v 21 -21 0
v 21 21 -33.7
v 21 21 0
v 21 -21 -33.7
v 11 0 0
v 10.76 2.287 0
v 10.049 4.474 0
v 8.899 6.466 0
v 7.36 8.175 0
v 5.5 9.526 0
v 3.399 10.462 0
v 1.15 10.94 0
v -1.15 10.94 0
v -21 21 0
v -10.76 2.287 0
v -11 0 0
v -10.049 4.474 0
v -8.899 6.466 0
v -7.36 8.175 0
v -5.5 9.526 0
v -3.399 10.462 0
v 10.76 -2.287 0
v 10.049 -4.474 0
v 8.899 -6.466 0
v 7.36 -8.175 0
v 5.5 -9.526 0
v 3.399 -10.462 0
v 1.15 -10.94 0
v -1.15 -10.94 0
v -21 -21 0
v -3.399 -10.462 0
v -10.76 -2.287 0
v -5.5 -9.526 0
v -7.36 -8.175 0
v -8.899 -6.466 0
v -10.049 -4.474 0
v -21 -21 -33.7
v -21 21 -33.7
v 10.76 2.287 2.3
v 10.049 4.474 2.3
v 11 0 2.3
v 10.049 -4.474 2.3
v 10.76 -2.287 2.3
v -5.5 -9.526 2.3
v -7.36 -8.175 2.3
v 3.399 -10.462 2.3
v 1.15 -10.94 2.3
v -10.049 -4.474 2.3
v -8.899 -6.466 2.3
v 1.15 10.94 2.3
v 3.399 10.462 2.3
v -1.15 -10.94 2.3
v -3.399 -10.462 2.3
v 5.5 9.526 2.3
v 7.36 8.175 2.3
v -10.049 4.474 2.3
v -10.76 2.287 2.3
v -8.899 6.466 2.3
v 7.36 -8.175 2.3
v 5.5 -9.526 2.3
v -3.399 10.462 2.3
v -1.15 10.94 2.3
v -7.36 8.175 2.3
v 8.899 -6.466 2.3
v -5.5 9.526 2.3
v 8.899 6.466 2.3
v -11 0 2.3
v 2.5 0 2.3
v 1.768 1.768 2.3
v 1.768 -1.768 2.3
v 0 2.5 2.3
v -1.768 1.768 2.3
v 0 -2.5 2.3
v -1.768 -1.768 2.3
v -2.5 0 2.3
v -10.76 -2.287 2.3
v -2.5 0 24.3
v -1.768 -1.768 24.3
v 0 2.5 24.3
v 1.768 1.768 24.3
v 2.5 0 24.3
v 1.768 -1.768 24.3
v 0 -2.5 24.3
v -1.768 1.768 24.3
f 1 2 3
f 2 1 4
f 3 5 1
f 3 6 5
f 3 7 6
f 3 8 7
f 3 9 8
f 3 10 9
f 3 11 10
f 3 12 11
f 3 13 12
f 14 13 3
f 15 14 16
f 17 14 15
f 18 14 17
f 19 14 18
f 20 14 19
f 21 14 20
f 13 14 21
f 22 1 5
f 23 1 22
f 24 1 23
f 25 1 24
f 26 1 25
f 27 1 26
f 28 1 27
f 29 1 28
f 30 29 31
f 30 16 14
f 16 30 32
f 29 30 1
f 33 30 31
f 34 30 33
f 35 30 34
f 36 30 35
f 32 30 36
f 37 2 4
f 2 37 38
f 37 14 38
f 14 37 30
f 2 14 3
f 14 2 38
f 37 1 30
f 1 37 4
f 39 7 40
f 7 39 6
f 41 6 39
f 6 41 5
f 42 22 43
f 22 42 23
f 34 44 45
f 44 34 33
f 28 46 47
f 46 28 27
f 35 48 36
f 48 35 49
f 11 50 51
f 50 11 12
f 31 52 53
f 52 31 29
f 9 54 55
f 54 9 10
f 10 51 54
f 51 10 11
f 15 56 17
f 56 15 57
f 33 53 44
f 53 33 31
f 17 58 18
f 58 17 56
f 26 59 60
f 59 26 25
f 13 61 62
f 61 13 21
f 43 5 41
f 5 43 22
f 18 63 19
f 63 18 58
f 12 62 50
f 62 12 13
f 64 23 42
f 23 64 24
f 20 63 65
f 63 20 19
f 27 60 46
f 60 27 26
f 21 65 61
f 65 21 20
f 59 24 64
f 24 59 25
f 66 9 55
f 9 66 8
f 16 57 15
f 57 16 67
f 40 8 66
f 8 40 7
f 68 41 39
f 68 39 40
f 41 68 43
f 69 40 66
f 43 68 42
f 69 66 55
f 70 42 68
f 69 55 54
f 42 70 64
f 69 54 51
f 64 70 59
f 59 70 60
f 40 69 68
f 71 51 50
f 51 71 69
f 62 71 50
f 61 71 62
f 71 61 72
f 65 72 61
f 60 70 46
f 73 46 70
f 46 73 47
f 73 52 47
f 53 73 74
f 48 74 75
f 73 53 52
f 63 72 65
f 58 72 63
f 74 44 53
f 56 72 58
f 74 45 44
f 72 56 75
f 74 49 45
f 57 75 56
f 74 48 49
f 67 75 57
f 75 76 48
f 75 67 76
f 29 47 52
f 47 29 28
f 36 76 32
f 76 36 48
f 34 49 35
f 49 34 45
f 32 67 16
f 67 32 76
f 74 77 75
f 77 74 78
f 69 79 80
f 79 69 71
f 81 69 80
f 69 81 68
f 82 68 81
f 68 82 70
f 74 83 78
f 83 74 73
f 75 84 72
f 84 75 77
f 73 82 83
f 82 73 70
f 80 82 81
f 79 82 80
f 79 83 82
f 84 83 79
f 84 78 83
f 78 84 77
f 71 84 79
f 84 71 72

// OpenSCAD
// file: params.scad
motor_gear_teeth = 10;
screw_gear_teeth = 26;

// Measure this flat-to-flat
screw_nut_hex_width=10.0;
screw_nut_height=4.0;
screw_clearance_diameter=20.0;

base_plate_thickness=5.0;

plate_gear_clearance=3.0;

gear_module = 2.0;
gear_width = 8.0;
gear_pressure_angle = 20.0;
gear_helix_angle=10.0;

motor_grub_screw_hole_diameter=1.0;
motor_shaft_diameter=5.0;
motor_shaft_extra_clearance_in_gear=0.2;
motor_shaft_clearance_diameter=10.0;
motor_centre_circle_diameter=22.0;
motor_centre_circle_depth=2.30;
motor_linear_side_length=42.00;
motor_locator_walls_side_clearance=0.50;
motor_body_height=33.70;
motor_locator_walls_thickness=3.00;
motor_locator_walls_depth=3.00;
motor_screw_pattern_side_length=35.0;
motor_screw_holes_diameter=3.5;
motor_shaft_length=22.00;

idle_gear_shaft_baseplate_hole_diameter=5.0;
idler_bolt_diameter=3.00;
idler_extra_bolt_clearance_in_gear=0.10;

eps=0.001;

// Computed
gear_offsets=0.5*gear_module*(screw_gear_teeth + motor_gear_teeth);
// main file
include <params.scad>

module motor_mockup() {
    
    translate([0.0, 0.0, -motor_body_height/2])
        cube([motor_linear_side_length, motor_linear_side_length, motor_body_height], center=true);
    
    // Locator ring
    translate([0.0, 0.0, -eps])
        cylinder(d=motor_centre_circle_diameter, h=motor_centre_circle_depth+eps);
    
    // Shaft
    translate([0.0, 0.0, motor_centre_circle_depth-eps])
        cylinder(d=motor_shaft_diameter, h=motor_shaft_length+eps);
    
};

motor_mockup();
